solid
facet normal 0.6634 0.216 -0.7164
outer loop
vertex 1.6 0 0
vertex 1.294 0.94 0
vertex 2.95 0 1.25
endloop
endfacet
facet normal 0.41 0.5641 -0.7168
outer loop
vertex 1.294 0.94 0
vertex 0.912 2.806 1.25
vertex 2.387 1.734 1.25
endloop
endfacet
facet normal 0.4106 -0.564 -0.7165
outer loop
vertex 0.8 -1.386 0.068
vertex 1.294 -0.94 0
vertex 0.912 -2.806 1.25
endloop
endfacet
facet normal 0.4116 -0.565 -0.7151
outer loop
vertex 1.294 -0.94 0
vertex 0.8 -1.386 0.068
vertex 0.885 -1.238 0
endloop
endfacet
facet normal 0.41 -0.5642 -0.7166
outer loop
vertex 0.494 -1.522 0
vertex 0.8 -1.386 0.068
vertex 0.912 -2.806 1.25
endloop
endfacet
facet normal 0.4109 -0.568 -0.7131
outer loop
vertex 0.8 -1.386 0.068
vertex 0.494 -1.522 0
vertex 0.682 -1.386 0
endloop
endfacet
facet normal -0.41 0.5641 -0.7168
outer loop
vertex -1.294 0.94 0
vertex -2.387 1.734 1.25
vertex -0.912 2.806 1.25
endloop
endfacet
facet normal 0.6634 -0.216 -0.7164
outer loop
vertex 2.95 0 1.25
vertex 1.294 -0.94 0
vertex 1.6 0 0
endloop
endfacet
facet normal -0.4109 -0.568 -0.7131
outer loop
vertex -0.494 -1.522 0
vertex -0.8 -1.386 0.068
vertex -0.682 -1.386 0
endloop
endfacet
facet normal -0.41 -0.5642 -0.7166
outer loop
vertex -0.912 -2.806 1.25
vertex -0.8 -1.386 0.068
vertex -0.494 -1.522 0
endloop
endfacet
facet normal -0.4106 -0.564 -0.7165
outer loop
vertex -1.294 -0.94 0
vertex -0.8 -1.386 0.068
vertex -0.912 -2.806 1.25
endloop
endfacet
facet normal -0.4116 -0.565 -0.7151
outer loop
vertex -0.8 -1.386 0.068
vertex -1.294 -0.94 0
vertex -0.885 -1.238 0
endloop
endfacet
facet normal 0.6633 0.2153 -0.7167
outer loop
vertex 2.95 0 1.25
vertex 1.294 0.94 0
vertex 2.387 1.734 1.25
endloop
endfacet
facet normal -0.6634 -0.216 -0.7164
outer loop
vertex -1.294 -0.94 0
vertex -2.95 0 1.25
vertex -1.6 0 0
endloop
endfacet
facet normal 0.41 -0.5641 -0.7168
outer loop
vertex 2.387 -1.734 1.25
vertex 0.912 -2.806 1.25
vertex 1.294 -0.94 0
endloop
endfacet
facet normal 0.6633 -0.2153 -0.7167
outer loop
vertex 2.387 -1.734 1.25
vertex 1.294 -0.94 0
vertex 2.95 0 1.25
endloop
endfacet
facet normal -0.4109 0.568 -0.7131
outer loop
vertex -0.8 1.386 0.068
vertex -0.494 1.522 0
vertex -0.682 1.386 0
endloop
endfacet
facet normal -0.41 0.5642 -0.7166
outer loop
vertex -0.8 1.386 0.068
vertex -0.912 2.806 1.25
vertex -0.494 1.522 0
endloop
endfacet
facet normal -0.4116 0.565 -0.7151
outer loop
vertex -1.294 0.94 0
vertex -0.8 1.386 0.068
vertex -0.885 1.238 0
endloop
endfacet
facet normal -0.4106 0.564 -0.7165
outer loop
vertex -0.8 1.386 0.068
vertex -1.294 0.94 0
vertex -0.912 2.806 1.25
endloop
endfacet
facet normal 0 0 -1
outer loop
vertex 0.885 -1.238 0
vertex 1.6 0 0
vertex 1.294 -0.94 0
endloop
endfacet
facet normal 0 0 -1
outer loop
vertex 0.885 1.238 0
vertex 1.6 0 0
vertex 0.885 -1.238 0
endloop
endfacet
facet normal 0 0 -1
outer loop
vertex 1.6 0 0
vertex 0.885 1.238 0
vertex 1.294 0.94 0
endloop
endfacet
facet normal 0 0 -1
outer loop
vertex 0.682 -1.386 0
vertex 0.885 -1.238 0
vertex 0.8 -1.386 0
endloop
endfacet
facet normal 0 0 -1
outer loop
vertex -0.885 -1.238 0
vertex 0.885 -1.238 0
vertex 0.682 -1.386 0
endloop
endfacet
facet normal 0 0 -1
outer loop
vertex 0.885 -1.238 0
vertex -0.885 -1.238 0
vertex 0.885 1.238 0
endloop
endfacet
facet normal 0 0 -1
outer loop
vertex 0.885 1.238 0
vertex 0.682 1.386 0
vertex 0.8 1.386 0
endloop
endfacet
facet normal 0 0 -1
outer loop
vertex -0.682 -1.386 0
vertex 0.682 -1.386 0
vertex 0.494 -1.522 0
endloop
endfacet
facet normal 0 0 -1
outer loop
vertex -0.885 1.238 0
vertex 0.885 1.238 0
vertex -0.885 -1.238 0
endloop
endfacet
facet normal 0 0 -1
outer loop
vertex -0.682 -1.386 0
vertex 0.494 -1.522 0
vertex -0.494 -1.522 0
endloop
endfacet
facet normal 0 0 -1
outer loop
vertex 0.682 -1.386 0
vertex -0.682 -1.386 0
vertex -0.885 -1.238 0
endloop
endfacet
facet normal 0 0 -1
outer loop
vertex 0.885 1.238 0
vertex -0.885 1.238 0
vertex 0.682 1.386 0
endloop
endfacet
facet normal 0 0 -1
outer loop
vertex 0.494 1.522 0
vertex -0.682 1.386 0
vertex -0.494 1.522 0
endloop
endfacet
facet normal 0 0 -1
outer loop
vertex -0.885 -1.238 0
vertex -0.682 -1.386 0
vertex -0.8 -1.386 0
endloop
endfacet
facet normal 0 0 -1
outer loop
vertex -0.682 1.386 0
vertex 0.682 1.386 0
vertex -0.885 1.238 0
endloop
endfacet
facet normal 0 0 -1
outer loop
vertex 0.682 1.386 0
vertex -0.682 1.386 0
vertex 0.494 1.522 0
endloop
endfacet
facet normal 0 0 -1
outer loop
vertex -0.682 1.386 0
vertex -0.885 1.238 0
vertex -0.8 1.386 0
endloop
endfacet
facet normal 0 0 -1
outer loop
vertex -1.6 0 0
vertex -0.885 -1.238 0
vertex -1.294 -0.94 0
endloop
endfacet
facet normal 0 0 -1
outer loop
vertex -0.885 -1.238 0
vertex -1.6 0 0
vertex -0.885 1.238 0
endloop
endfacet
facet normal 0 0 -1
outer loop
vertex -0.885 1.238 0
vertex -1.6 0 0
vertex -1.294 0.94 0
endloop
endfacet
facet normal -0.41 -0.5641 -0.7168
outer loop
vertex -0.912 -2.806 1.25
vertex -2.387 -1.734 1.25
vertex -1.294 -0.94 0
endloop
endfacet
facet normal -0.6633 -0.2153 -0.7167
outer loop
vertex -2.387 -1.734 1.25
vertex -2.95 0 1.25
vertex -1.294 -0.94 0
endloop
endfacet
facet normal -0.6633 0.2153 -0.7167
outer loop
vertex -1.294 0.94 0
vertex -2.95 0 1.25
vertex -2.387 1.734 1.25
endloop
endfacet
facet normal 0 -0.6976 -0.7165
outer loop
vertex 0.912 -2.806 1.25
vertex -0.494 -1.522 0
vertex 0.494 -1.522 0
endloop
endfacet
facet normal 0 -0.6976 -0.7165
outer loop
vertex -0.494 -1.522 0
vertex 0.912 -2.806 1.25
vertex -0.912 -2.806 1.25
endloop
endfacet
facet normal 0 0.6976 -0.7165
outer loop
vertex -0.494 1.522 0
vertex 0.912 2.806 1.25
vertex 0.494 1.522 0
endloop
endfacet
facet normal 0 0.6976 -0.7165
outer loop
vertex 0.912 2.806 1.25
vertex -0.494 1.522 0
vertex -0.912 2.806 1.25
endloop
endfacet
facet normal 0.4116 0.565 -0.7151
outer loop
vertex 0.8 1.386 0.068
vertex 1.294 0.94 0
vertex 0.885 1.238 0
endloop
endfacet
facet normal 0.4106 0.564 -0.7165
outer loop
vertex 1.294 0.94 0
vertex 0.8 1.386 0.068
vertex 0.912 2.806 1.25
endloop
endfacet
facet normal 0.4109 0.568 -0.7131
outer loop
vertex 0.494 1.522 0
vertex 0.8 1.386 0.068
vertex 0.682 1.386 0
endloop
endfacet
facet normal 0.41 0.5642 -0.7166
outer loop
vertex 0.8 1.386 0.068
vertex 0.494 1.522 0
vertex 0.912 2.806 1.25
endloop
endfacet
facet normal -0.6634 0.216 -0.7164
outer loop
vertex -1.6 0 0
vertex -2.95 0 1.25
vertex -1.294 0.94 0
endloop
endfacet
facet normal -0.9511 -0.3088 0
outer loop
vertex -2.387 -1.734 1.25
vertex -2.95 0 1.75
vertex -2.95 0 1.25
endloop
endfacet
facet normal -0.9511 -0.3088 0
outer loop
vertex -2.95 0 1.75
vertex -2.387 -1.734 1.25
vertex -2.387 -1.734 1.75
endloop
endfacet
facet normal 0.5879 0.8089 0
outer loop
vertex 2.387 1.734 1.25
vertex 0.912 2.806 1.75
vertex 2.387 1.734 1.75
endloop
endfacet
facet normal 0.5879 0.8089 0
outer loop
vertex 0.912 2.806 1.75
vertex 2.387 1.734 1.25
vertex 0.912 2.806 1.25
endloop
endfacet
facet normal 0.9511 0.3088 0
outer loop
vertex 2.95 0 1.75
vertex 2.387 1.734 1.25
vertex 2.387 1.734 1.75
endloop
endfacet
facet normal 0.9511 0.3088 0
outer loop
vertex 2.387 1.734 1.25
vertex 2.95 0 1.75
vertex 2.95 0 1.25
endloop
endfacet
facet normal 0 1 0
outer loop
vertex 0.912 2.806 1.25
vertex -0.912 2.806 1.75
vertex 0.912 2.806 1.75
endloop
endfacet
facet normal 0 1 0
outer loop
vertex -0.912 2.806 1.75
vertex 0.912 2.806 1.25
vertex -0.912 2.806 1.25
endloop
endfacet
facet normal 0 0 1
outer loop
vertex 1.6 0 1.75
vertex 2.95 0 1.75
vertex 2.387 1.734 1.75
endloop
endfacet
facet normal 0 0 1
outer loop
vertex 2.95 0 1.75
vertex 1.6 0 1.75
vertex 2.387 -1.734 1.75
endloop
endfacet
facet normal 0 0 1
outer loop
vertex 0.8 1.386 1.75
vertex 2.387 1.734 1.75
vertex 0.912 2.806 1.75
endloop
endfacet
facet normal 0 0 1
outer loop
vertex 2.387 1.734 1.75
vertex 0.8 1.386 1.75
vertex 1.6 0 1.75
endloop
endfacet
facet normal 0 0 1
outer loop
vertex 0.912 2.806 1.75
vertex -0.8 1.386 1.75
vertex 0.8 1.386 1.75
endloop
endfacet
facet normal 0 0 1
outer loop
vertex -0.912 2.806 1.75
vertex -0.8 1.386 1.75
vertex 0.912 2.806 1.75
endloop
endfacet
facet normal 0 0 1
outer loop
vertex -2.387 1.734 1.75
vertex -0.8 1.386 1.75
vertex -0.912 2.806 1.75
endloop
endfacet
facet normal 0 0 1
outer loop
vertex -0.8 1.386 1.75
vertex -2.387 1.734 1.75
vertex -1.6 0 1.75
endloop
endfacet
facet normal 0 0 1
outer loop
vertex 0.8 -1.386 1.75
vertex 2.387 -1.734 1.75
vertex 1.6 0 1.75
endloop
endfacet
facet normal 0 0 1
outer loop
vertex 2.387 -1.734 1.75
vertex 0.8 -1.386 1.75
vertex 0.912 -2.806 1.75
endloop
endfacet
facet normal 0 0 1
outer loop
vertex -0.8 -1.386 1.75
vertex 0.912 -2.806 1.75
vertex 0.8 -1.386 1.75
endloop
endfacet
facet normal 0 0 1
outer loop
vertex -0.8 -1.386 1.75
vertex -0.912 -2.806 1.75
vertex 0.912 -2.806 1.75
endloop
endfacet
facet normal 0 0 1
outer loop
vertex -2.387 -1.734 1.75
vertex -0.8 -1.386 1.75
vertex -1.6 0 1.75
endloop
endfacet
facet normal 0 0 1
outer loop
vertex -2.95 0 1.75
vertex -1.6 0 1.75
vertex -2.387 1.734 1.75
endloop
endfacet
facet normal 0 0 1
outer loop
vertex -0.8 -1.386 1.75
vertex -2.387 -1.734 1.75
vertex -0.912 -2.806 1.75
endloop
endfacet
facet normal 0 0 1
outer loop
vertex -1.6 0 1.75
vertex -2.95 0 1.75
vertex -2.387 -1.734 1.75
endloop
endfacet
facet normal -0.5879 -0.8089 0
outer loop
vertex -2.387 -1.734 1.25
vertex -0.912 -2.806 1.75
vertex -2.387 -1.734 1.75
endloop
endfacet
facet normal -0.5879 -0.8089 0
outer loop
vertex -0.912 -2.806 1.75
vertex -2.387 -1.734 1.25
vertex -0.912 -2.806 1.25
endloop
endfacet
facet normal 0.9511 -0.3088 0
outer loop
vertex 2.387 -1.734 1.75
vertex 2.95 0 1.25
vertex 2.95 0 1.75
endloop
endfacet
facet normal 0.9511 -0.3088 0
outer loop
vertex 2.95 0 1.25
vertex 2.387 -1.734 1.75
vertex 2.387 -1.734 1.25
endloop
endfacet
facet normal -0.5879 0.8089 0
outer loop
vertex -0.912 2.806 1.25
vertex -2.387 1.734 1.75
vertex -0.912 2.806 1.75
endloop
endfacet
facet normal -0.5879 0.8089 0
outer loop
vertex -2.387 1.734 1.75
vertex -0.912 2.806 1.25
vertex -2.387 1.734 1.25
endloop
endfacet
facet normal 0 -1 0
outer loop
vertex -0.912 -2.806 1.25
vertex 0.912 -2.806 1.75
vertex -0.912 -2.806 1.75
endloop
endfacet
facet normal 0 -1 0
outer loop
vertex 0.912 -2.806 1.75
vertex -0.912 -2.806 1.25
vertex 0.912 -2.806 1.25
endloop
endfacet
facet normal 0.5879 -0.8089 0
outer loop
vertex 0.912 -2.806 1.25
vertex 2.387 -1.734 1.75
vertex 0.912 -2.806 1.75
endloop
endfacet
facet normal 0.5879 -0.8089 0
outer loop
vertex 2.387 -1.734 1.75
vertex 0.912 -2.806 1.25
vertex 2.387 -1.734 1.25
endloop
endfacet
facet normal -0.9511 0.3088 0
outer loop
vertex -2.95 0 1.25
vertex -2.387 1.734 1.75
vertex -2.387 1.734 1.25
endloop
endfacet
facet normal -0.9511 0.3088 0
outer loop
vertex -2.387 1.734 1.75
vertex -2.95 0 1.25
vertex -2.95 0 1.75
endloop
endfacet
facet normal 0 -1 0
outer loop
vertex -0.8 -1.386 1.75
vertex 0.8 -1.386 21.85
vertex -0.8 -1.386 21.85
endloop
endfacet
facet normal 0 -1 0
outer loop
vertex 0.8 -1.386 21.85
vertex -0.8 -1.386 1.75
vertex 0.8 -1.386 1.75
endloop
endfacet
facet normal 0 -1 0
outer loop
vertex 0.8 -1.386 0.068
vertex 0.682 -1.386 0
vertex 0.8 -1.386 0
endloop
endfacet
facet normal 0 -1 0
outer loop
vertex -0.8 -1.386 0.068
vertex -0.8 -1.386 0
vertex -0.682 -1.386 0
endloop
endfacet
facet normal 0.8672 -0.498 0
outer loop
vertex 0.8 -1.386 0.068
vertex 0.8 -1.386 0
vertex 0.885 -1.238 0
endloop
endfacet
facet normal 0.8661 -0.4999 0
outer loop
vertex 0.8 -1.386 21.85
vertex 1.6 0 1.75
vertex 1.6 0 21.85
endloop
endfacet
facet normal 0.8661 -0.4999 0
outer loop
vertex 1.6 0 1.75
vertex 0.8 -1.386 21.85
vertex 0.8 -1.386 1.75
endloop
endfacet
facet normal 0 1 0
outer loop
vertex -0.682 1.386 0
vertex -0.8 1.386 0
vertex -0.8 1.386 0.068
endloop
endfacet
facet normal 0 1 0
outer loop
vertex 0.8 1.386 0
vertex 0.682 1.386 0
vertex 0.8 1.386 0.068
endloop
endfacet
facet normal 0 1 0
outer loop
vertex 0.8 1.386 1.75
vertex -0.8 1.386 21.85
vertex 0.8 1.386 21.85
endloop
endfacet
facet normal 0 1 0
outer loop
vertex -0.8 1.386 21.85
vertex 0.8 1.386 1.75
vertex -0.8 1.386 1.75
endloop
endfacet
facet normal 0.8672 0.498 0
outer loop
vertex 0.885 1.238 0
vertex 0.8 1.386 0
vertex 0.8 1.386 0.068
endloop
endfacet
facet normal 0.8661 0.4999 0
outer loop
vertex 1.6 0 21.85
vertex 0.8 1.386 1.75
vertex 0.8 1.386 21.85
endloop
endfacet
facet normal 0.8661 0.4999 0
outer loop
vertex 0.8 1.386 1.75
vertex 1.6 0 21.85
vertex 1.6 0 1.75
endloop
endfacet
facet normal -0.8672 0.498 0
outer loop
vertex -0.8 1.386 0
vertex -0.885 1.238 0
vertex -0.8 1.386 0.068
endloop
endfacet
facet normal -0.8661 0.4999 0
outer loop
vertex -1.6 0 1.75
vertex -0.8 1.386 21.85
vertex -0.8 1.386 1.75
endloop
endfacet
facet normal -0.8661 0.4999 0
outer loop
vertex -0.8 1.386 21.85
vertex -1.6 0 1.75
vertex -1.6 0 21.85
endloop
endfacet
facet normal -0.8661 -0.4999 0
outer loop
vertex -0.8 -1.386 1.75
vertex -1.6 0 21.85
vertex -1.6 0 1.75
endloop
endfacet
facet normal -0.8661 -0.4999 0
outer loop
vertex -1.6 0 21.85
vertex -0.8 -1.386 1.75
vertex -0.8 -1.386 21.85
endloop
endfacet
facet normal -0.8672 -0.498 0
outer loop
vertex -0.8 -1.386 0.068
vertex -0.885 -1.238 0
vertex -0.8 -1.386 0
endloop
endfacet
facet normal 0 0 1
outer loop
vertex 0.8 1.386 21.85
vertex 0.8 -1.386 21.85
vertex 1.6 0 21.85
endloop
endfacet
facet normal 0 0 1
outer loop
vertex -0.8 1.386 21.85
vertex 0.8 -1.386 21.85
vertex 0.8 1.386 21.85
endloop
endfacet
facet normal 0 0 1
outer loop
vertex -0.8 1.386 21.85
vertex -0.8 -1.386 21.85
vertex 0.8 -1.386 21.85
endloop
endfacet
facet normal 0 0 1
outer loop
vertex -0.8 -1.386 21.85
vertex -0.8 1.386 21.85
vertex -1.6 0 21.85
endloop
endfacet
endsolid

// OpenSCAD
screw_iso7380(20, extra = 0.1, outline = true);

module screw_iso7380(length, outline = false, extra = 0) {
    screw_iso7380_base(head_r = 5.7/2+extra, head_h = 1.65+extra, 
        screw_r = 3/2+extra, length = length+extra, outline = outline);
}

module screw_iso7380_base(head_r, head_h, screw_r, length, outline) {
    difference() {
        union() {
            cylinder(r1 = screw_r, r2 = head_r, h = head_h-0.5);
            translate([0, 0, head_h-0.5]) cylinder(r = head_r, h = 0.5);
            cylinder(r = screw_r, h = head_h + length);
        }
        if(!outline)
        {
            translate([0, 0, -0.1]) cylinder(r = screw_r-0.5, h = 1, $fn = 6);
        }
    }
}

module screw_din912(type, length, extra_raduis = 0.1, outline = false) {
    if(type == "m3") 
    {
        screw_din912_base(head_r  = m3_head_radius, head_h = 3.1, 
                   screw_r = m3_radius, length = length, outline = outline);
    } else if(type == "m2.5") 
    {
        screw_din912_base(head_r  = 4.85/2 + extra_raduis, head_h = 2.5, 
                   screw_r = 2.5/2 + extra_raduis, length = length, outline = outline);
    } else if(type == "m2") 
    {
        screw_din912_base(head_r  = 3.8/2 + extra_raduis, head_h = 2, 
                   screw_r = 2/2 + extra_raduis, length = length, outline = outline);
    }
}

module screw_din912_base(head_r, head_h, screw_r, length, outline) {
    difference() {
        union() {
            cylinder(r = head_r, h = head_h);
            cylinder(r = screw_r, h = head_h + length);
        }
        if(!outline)
        {
            translate([0, 0, -0.1]) cylinder(r = screw_r, h = 1, $fn = 6);
        }
    }
}
